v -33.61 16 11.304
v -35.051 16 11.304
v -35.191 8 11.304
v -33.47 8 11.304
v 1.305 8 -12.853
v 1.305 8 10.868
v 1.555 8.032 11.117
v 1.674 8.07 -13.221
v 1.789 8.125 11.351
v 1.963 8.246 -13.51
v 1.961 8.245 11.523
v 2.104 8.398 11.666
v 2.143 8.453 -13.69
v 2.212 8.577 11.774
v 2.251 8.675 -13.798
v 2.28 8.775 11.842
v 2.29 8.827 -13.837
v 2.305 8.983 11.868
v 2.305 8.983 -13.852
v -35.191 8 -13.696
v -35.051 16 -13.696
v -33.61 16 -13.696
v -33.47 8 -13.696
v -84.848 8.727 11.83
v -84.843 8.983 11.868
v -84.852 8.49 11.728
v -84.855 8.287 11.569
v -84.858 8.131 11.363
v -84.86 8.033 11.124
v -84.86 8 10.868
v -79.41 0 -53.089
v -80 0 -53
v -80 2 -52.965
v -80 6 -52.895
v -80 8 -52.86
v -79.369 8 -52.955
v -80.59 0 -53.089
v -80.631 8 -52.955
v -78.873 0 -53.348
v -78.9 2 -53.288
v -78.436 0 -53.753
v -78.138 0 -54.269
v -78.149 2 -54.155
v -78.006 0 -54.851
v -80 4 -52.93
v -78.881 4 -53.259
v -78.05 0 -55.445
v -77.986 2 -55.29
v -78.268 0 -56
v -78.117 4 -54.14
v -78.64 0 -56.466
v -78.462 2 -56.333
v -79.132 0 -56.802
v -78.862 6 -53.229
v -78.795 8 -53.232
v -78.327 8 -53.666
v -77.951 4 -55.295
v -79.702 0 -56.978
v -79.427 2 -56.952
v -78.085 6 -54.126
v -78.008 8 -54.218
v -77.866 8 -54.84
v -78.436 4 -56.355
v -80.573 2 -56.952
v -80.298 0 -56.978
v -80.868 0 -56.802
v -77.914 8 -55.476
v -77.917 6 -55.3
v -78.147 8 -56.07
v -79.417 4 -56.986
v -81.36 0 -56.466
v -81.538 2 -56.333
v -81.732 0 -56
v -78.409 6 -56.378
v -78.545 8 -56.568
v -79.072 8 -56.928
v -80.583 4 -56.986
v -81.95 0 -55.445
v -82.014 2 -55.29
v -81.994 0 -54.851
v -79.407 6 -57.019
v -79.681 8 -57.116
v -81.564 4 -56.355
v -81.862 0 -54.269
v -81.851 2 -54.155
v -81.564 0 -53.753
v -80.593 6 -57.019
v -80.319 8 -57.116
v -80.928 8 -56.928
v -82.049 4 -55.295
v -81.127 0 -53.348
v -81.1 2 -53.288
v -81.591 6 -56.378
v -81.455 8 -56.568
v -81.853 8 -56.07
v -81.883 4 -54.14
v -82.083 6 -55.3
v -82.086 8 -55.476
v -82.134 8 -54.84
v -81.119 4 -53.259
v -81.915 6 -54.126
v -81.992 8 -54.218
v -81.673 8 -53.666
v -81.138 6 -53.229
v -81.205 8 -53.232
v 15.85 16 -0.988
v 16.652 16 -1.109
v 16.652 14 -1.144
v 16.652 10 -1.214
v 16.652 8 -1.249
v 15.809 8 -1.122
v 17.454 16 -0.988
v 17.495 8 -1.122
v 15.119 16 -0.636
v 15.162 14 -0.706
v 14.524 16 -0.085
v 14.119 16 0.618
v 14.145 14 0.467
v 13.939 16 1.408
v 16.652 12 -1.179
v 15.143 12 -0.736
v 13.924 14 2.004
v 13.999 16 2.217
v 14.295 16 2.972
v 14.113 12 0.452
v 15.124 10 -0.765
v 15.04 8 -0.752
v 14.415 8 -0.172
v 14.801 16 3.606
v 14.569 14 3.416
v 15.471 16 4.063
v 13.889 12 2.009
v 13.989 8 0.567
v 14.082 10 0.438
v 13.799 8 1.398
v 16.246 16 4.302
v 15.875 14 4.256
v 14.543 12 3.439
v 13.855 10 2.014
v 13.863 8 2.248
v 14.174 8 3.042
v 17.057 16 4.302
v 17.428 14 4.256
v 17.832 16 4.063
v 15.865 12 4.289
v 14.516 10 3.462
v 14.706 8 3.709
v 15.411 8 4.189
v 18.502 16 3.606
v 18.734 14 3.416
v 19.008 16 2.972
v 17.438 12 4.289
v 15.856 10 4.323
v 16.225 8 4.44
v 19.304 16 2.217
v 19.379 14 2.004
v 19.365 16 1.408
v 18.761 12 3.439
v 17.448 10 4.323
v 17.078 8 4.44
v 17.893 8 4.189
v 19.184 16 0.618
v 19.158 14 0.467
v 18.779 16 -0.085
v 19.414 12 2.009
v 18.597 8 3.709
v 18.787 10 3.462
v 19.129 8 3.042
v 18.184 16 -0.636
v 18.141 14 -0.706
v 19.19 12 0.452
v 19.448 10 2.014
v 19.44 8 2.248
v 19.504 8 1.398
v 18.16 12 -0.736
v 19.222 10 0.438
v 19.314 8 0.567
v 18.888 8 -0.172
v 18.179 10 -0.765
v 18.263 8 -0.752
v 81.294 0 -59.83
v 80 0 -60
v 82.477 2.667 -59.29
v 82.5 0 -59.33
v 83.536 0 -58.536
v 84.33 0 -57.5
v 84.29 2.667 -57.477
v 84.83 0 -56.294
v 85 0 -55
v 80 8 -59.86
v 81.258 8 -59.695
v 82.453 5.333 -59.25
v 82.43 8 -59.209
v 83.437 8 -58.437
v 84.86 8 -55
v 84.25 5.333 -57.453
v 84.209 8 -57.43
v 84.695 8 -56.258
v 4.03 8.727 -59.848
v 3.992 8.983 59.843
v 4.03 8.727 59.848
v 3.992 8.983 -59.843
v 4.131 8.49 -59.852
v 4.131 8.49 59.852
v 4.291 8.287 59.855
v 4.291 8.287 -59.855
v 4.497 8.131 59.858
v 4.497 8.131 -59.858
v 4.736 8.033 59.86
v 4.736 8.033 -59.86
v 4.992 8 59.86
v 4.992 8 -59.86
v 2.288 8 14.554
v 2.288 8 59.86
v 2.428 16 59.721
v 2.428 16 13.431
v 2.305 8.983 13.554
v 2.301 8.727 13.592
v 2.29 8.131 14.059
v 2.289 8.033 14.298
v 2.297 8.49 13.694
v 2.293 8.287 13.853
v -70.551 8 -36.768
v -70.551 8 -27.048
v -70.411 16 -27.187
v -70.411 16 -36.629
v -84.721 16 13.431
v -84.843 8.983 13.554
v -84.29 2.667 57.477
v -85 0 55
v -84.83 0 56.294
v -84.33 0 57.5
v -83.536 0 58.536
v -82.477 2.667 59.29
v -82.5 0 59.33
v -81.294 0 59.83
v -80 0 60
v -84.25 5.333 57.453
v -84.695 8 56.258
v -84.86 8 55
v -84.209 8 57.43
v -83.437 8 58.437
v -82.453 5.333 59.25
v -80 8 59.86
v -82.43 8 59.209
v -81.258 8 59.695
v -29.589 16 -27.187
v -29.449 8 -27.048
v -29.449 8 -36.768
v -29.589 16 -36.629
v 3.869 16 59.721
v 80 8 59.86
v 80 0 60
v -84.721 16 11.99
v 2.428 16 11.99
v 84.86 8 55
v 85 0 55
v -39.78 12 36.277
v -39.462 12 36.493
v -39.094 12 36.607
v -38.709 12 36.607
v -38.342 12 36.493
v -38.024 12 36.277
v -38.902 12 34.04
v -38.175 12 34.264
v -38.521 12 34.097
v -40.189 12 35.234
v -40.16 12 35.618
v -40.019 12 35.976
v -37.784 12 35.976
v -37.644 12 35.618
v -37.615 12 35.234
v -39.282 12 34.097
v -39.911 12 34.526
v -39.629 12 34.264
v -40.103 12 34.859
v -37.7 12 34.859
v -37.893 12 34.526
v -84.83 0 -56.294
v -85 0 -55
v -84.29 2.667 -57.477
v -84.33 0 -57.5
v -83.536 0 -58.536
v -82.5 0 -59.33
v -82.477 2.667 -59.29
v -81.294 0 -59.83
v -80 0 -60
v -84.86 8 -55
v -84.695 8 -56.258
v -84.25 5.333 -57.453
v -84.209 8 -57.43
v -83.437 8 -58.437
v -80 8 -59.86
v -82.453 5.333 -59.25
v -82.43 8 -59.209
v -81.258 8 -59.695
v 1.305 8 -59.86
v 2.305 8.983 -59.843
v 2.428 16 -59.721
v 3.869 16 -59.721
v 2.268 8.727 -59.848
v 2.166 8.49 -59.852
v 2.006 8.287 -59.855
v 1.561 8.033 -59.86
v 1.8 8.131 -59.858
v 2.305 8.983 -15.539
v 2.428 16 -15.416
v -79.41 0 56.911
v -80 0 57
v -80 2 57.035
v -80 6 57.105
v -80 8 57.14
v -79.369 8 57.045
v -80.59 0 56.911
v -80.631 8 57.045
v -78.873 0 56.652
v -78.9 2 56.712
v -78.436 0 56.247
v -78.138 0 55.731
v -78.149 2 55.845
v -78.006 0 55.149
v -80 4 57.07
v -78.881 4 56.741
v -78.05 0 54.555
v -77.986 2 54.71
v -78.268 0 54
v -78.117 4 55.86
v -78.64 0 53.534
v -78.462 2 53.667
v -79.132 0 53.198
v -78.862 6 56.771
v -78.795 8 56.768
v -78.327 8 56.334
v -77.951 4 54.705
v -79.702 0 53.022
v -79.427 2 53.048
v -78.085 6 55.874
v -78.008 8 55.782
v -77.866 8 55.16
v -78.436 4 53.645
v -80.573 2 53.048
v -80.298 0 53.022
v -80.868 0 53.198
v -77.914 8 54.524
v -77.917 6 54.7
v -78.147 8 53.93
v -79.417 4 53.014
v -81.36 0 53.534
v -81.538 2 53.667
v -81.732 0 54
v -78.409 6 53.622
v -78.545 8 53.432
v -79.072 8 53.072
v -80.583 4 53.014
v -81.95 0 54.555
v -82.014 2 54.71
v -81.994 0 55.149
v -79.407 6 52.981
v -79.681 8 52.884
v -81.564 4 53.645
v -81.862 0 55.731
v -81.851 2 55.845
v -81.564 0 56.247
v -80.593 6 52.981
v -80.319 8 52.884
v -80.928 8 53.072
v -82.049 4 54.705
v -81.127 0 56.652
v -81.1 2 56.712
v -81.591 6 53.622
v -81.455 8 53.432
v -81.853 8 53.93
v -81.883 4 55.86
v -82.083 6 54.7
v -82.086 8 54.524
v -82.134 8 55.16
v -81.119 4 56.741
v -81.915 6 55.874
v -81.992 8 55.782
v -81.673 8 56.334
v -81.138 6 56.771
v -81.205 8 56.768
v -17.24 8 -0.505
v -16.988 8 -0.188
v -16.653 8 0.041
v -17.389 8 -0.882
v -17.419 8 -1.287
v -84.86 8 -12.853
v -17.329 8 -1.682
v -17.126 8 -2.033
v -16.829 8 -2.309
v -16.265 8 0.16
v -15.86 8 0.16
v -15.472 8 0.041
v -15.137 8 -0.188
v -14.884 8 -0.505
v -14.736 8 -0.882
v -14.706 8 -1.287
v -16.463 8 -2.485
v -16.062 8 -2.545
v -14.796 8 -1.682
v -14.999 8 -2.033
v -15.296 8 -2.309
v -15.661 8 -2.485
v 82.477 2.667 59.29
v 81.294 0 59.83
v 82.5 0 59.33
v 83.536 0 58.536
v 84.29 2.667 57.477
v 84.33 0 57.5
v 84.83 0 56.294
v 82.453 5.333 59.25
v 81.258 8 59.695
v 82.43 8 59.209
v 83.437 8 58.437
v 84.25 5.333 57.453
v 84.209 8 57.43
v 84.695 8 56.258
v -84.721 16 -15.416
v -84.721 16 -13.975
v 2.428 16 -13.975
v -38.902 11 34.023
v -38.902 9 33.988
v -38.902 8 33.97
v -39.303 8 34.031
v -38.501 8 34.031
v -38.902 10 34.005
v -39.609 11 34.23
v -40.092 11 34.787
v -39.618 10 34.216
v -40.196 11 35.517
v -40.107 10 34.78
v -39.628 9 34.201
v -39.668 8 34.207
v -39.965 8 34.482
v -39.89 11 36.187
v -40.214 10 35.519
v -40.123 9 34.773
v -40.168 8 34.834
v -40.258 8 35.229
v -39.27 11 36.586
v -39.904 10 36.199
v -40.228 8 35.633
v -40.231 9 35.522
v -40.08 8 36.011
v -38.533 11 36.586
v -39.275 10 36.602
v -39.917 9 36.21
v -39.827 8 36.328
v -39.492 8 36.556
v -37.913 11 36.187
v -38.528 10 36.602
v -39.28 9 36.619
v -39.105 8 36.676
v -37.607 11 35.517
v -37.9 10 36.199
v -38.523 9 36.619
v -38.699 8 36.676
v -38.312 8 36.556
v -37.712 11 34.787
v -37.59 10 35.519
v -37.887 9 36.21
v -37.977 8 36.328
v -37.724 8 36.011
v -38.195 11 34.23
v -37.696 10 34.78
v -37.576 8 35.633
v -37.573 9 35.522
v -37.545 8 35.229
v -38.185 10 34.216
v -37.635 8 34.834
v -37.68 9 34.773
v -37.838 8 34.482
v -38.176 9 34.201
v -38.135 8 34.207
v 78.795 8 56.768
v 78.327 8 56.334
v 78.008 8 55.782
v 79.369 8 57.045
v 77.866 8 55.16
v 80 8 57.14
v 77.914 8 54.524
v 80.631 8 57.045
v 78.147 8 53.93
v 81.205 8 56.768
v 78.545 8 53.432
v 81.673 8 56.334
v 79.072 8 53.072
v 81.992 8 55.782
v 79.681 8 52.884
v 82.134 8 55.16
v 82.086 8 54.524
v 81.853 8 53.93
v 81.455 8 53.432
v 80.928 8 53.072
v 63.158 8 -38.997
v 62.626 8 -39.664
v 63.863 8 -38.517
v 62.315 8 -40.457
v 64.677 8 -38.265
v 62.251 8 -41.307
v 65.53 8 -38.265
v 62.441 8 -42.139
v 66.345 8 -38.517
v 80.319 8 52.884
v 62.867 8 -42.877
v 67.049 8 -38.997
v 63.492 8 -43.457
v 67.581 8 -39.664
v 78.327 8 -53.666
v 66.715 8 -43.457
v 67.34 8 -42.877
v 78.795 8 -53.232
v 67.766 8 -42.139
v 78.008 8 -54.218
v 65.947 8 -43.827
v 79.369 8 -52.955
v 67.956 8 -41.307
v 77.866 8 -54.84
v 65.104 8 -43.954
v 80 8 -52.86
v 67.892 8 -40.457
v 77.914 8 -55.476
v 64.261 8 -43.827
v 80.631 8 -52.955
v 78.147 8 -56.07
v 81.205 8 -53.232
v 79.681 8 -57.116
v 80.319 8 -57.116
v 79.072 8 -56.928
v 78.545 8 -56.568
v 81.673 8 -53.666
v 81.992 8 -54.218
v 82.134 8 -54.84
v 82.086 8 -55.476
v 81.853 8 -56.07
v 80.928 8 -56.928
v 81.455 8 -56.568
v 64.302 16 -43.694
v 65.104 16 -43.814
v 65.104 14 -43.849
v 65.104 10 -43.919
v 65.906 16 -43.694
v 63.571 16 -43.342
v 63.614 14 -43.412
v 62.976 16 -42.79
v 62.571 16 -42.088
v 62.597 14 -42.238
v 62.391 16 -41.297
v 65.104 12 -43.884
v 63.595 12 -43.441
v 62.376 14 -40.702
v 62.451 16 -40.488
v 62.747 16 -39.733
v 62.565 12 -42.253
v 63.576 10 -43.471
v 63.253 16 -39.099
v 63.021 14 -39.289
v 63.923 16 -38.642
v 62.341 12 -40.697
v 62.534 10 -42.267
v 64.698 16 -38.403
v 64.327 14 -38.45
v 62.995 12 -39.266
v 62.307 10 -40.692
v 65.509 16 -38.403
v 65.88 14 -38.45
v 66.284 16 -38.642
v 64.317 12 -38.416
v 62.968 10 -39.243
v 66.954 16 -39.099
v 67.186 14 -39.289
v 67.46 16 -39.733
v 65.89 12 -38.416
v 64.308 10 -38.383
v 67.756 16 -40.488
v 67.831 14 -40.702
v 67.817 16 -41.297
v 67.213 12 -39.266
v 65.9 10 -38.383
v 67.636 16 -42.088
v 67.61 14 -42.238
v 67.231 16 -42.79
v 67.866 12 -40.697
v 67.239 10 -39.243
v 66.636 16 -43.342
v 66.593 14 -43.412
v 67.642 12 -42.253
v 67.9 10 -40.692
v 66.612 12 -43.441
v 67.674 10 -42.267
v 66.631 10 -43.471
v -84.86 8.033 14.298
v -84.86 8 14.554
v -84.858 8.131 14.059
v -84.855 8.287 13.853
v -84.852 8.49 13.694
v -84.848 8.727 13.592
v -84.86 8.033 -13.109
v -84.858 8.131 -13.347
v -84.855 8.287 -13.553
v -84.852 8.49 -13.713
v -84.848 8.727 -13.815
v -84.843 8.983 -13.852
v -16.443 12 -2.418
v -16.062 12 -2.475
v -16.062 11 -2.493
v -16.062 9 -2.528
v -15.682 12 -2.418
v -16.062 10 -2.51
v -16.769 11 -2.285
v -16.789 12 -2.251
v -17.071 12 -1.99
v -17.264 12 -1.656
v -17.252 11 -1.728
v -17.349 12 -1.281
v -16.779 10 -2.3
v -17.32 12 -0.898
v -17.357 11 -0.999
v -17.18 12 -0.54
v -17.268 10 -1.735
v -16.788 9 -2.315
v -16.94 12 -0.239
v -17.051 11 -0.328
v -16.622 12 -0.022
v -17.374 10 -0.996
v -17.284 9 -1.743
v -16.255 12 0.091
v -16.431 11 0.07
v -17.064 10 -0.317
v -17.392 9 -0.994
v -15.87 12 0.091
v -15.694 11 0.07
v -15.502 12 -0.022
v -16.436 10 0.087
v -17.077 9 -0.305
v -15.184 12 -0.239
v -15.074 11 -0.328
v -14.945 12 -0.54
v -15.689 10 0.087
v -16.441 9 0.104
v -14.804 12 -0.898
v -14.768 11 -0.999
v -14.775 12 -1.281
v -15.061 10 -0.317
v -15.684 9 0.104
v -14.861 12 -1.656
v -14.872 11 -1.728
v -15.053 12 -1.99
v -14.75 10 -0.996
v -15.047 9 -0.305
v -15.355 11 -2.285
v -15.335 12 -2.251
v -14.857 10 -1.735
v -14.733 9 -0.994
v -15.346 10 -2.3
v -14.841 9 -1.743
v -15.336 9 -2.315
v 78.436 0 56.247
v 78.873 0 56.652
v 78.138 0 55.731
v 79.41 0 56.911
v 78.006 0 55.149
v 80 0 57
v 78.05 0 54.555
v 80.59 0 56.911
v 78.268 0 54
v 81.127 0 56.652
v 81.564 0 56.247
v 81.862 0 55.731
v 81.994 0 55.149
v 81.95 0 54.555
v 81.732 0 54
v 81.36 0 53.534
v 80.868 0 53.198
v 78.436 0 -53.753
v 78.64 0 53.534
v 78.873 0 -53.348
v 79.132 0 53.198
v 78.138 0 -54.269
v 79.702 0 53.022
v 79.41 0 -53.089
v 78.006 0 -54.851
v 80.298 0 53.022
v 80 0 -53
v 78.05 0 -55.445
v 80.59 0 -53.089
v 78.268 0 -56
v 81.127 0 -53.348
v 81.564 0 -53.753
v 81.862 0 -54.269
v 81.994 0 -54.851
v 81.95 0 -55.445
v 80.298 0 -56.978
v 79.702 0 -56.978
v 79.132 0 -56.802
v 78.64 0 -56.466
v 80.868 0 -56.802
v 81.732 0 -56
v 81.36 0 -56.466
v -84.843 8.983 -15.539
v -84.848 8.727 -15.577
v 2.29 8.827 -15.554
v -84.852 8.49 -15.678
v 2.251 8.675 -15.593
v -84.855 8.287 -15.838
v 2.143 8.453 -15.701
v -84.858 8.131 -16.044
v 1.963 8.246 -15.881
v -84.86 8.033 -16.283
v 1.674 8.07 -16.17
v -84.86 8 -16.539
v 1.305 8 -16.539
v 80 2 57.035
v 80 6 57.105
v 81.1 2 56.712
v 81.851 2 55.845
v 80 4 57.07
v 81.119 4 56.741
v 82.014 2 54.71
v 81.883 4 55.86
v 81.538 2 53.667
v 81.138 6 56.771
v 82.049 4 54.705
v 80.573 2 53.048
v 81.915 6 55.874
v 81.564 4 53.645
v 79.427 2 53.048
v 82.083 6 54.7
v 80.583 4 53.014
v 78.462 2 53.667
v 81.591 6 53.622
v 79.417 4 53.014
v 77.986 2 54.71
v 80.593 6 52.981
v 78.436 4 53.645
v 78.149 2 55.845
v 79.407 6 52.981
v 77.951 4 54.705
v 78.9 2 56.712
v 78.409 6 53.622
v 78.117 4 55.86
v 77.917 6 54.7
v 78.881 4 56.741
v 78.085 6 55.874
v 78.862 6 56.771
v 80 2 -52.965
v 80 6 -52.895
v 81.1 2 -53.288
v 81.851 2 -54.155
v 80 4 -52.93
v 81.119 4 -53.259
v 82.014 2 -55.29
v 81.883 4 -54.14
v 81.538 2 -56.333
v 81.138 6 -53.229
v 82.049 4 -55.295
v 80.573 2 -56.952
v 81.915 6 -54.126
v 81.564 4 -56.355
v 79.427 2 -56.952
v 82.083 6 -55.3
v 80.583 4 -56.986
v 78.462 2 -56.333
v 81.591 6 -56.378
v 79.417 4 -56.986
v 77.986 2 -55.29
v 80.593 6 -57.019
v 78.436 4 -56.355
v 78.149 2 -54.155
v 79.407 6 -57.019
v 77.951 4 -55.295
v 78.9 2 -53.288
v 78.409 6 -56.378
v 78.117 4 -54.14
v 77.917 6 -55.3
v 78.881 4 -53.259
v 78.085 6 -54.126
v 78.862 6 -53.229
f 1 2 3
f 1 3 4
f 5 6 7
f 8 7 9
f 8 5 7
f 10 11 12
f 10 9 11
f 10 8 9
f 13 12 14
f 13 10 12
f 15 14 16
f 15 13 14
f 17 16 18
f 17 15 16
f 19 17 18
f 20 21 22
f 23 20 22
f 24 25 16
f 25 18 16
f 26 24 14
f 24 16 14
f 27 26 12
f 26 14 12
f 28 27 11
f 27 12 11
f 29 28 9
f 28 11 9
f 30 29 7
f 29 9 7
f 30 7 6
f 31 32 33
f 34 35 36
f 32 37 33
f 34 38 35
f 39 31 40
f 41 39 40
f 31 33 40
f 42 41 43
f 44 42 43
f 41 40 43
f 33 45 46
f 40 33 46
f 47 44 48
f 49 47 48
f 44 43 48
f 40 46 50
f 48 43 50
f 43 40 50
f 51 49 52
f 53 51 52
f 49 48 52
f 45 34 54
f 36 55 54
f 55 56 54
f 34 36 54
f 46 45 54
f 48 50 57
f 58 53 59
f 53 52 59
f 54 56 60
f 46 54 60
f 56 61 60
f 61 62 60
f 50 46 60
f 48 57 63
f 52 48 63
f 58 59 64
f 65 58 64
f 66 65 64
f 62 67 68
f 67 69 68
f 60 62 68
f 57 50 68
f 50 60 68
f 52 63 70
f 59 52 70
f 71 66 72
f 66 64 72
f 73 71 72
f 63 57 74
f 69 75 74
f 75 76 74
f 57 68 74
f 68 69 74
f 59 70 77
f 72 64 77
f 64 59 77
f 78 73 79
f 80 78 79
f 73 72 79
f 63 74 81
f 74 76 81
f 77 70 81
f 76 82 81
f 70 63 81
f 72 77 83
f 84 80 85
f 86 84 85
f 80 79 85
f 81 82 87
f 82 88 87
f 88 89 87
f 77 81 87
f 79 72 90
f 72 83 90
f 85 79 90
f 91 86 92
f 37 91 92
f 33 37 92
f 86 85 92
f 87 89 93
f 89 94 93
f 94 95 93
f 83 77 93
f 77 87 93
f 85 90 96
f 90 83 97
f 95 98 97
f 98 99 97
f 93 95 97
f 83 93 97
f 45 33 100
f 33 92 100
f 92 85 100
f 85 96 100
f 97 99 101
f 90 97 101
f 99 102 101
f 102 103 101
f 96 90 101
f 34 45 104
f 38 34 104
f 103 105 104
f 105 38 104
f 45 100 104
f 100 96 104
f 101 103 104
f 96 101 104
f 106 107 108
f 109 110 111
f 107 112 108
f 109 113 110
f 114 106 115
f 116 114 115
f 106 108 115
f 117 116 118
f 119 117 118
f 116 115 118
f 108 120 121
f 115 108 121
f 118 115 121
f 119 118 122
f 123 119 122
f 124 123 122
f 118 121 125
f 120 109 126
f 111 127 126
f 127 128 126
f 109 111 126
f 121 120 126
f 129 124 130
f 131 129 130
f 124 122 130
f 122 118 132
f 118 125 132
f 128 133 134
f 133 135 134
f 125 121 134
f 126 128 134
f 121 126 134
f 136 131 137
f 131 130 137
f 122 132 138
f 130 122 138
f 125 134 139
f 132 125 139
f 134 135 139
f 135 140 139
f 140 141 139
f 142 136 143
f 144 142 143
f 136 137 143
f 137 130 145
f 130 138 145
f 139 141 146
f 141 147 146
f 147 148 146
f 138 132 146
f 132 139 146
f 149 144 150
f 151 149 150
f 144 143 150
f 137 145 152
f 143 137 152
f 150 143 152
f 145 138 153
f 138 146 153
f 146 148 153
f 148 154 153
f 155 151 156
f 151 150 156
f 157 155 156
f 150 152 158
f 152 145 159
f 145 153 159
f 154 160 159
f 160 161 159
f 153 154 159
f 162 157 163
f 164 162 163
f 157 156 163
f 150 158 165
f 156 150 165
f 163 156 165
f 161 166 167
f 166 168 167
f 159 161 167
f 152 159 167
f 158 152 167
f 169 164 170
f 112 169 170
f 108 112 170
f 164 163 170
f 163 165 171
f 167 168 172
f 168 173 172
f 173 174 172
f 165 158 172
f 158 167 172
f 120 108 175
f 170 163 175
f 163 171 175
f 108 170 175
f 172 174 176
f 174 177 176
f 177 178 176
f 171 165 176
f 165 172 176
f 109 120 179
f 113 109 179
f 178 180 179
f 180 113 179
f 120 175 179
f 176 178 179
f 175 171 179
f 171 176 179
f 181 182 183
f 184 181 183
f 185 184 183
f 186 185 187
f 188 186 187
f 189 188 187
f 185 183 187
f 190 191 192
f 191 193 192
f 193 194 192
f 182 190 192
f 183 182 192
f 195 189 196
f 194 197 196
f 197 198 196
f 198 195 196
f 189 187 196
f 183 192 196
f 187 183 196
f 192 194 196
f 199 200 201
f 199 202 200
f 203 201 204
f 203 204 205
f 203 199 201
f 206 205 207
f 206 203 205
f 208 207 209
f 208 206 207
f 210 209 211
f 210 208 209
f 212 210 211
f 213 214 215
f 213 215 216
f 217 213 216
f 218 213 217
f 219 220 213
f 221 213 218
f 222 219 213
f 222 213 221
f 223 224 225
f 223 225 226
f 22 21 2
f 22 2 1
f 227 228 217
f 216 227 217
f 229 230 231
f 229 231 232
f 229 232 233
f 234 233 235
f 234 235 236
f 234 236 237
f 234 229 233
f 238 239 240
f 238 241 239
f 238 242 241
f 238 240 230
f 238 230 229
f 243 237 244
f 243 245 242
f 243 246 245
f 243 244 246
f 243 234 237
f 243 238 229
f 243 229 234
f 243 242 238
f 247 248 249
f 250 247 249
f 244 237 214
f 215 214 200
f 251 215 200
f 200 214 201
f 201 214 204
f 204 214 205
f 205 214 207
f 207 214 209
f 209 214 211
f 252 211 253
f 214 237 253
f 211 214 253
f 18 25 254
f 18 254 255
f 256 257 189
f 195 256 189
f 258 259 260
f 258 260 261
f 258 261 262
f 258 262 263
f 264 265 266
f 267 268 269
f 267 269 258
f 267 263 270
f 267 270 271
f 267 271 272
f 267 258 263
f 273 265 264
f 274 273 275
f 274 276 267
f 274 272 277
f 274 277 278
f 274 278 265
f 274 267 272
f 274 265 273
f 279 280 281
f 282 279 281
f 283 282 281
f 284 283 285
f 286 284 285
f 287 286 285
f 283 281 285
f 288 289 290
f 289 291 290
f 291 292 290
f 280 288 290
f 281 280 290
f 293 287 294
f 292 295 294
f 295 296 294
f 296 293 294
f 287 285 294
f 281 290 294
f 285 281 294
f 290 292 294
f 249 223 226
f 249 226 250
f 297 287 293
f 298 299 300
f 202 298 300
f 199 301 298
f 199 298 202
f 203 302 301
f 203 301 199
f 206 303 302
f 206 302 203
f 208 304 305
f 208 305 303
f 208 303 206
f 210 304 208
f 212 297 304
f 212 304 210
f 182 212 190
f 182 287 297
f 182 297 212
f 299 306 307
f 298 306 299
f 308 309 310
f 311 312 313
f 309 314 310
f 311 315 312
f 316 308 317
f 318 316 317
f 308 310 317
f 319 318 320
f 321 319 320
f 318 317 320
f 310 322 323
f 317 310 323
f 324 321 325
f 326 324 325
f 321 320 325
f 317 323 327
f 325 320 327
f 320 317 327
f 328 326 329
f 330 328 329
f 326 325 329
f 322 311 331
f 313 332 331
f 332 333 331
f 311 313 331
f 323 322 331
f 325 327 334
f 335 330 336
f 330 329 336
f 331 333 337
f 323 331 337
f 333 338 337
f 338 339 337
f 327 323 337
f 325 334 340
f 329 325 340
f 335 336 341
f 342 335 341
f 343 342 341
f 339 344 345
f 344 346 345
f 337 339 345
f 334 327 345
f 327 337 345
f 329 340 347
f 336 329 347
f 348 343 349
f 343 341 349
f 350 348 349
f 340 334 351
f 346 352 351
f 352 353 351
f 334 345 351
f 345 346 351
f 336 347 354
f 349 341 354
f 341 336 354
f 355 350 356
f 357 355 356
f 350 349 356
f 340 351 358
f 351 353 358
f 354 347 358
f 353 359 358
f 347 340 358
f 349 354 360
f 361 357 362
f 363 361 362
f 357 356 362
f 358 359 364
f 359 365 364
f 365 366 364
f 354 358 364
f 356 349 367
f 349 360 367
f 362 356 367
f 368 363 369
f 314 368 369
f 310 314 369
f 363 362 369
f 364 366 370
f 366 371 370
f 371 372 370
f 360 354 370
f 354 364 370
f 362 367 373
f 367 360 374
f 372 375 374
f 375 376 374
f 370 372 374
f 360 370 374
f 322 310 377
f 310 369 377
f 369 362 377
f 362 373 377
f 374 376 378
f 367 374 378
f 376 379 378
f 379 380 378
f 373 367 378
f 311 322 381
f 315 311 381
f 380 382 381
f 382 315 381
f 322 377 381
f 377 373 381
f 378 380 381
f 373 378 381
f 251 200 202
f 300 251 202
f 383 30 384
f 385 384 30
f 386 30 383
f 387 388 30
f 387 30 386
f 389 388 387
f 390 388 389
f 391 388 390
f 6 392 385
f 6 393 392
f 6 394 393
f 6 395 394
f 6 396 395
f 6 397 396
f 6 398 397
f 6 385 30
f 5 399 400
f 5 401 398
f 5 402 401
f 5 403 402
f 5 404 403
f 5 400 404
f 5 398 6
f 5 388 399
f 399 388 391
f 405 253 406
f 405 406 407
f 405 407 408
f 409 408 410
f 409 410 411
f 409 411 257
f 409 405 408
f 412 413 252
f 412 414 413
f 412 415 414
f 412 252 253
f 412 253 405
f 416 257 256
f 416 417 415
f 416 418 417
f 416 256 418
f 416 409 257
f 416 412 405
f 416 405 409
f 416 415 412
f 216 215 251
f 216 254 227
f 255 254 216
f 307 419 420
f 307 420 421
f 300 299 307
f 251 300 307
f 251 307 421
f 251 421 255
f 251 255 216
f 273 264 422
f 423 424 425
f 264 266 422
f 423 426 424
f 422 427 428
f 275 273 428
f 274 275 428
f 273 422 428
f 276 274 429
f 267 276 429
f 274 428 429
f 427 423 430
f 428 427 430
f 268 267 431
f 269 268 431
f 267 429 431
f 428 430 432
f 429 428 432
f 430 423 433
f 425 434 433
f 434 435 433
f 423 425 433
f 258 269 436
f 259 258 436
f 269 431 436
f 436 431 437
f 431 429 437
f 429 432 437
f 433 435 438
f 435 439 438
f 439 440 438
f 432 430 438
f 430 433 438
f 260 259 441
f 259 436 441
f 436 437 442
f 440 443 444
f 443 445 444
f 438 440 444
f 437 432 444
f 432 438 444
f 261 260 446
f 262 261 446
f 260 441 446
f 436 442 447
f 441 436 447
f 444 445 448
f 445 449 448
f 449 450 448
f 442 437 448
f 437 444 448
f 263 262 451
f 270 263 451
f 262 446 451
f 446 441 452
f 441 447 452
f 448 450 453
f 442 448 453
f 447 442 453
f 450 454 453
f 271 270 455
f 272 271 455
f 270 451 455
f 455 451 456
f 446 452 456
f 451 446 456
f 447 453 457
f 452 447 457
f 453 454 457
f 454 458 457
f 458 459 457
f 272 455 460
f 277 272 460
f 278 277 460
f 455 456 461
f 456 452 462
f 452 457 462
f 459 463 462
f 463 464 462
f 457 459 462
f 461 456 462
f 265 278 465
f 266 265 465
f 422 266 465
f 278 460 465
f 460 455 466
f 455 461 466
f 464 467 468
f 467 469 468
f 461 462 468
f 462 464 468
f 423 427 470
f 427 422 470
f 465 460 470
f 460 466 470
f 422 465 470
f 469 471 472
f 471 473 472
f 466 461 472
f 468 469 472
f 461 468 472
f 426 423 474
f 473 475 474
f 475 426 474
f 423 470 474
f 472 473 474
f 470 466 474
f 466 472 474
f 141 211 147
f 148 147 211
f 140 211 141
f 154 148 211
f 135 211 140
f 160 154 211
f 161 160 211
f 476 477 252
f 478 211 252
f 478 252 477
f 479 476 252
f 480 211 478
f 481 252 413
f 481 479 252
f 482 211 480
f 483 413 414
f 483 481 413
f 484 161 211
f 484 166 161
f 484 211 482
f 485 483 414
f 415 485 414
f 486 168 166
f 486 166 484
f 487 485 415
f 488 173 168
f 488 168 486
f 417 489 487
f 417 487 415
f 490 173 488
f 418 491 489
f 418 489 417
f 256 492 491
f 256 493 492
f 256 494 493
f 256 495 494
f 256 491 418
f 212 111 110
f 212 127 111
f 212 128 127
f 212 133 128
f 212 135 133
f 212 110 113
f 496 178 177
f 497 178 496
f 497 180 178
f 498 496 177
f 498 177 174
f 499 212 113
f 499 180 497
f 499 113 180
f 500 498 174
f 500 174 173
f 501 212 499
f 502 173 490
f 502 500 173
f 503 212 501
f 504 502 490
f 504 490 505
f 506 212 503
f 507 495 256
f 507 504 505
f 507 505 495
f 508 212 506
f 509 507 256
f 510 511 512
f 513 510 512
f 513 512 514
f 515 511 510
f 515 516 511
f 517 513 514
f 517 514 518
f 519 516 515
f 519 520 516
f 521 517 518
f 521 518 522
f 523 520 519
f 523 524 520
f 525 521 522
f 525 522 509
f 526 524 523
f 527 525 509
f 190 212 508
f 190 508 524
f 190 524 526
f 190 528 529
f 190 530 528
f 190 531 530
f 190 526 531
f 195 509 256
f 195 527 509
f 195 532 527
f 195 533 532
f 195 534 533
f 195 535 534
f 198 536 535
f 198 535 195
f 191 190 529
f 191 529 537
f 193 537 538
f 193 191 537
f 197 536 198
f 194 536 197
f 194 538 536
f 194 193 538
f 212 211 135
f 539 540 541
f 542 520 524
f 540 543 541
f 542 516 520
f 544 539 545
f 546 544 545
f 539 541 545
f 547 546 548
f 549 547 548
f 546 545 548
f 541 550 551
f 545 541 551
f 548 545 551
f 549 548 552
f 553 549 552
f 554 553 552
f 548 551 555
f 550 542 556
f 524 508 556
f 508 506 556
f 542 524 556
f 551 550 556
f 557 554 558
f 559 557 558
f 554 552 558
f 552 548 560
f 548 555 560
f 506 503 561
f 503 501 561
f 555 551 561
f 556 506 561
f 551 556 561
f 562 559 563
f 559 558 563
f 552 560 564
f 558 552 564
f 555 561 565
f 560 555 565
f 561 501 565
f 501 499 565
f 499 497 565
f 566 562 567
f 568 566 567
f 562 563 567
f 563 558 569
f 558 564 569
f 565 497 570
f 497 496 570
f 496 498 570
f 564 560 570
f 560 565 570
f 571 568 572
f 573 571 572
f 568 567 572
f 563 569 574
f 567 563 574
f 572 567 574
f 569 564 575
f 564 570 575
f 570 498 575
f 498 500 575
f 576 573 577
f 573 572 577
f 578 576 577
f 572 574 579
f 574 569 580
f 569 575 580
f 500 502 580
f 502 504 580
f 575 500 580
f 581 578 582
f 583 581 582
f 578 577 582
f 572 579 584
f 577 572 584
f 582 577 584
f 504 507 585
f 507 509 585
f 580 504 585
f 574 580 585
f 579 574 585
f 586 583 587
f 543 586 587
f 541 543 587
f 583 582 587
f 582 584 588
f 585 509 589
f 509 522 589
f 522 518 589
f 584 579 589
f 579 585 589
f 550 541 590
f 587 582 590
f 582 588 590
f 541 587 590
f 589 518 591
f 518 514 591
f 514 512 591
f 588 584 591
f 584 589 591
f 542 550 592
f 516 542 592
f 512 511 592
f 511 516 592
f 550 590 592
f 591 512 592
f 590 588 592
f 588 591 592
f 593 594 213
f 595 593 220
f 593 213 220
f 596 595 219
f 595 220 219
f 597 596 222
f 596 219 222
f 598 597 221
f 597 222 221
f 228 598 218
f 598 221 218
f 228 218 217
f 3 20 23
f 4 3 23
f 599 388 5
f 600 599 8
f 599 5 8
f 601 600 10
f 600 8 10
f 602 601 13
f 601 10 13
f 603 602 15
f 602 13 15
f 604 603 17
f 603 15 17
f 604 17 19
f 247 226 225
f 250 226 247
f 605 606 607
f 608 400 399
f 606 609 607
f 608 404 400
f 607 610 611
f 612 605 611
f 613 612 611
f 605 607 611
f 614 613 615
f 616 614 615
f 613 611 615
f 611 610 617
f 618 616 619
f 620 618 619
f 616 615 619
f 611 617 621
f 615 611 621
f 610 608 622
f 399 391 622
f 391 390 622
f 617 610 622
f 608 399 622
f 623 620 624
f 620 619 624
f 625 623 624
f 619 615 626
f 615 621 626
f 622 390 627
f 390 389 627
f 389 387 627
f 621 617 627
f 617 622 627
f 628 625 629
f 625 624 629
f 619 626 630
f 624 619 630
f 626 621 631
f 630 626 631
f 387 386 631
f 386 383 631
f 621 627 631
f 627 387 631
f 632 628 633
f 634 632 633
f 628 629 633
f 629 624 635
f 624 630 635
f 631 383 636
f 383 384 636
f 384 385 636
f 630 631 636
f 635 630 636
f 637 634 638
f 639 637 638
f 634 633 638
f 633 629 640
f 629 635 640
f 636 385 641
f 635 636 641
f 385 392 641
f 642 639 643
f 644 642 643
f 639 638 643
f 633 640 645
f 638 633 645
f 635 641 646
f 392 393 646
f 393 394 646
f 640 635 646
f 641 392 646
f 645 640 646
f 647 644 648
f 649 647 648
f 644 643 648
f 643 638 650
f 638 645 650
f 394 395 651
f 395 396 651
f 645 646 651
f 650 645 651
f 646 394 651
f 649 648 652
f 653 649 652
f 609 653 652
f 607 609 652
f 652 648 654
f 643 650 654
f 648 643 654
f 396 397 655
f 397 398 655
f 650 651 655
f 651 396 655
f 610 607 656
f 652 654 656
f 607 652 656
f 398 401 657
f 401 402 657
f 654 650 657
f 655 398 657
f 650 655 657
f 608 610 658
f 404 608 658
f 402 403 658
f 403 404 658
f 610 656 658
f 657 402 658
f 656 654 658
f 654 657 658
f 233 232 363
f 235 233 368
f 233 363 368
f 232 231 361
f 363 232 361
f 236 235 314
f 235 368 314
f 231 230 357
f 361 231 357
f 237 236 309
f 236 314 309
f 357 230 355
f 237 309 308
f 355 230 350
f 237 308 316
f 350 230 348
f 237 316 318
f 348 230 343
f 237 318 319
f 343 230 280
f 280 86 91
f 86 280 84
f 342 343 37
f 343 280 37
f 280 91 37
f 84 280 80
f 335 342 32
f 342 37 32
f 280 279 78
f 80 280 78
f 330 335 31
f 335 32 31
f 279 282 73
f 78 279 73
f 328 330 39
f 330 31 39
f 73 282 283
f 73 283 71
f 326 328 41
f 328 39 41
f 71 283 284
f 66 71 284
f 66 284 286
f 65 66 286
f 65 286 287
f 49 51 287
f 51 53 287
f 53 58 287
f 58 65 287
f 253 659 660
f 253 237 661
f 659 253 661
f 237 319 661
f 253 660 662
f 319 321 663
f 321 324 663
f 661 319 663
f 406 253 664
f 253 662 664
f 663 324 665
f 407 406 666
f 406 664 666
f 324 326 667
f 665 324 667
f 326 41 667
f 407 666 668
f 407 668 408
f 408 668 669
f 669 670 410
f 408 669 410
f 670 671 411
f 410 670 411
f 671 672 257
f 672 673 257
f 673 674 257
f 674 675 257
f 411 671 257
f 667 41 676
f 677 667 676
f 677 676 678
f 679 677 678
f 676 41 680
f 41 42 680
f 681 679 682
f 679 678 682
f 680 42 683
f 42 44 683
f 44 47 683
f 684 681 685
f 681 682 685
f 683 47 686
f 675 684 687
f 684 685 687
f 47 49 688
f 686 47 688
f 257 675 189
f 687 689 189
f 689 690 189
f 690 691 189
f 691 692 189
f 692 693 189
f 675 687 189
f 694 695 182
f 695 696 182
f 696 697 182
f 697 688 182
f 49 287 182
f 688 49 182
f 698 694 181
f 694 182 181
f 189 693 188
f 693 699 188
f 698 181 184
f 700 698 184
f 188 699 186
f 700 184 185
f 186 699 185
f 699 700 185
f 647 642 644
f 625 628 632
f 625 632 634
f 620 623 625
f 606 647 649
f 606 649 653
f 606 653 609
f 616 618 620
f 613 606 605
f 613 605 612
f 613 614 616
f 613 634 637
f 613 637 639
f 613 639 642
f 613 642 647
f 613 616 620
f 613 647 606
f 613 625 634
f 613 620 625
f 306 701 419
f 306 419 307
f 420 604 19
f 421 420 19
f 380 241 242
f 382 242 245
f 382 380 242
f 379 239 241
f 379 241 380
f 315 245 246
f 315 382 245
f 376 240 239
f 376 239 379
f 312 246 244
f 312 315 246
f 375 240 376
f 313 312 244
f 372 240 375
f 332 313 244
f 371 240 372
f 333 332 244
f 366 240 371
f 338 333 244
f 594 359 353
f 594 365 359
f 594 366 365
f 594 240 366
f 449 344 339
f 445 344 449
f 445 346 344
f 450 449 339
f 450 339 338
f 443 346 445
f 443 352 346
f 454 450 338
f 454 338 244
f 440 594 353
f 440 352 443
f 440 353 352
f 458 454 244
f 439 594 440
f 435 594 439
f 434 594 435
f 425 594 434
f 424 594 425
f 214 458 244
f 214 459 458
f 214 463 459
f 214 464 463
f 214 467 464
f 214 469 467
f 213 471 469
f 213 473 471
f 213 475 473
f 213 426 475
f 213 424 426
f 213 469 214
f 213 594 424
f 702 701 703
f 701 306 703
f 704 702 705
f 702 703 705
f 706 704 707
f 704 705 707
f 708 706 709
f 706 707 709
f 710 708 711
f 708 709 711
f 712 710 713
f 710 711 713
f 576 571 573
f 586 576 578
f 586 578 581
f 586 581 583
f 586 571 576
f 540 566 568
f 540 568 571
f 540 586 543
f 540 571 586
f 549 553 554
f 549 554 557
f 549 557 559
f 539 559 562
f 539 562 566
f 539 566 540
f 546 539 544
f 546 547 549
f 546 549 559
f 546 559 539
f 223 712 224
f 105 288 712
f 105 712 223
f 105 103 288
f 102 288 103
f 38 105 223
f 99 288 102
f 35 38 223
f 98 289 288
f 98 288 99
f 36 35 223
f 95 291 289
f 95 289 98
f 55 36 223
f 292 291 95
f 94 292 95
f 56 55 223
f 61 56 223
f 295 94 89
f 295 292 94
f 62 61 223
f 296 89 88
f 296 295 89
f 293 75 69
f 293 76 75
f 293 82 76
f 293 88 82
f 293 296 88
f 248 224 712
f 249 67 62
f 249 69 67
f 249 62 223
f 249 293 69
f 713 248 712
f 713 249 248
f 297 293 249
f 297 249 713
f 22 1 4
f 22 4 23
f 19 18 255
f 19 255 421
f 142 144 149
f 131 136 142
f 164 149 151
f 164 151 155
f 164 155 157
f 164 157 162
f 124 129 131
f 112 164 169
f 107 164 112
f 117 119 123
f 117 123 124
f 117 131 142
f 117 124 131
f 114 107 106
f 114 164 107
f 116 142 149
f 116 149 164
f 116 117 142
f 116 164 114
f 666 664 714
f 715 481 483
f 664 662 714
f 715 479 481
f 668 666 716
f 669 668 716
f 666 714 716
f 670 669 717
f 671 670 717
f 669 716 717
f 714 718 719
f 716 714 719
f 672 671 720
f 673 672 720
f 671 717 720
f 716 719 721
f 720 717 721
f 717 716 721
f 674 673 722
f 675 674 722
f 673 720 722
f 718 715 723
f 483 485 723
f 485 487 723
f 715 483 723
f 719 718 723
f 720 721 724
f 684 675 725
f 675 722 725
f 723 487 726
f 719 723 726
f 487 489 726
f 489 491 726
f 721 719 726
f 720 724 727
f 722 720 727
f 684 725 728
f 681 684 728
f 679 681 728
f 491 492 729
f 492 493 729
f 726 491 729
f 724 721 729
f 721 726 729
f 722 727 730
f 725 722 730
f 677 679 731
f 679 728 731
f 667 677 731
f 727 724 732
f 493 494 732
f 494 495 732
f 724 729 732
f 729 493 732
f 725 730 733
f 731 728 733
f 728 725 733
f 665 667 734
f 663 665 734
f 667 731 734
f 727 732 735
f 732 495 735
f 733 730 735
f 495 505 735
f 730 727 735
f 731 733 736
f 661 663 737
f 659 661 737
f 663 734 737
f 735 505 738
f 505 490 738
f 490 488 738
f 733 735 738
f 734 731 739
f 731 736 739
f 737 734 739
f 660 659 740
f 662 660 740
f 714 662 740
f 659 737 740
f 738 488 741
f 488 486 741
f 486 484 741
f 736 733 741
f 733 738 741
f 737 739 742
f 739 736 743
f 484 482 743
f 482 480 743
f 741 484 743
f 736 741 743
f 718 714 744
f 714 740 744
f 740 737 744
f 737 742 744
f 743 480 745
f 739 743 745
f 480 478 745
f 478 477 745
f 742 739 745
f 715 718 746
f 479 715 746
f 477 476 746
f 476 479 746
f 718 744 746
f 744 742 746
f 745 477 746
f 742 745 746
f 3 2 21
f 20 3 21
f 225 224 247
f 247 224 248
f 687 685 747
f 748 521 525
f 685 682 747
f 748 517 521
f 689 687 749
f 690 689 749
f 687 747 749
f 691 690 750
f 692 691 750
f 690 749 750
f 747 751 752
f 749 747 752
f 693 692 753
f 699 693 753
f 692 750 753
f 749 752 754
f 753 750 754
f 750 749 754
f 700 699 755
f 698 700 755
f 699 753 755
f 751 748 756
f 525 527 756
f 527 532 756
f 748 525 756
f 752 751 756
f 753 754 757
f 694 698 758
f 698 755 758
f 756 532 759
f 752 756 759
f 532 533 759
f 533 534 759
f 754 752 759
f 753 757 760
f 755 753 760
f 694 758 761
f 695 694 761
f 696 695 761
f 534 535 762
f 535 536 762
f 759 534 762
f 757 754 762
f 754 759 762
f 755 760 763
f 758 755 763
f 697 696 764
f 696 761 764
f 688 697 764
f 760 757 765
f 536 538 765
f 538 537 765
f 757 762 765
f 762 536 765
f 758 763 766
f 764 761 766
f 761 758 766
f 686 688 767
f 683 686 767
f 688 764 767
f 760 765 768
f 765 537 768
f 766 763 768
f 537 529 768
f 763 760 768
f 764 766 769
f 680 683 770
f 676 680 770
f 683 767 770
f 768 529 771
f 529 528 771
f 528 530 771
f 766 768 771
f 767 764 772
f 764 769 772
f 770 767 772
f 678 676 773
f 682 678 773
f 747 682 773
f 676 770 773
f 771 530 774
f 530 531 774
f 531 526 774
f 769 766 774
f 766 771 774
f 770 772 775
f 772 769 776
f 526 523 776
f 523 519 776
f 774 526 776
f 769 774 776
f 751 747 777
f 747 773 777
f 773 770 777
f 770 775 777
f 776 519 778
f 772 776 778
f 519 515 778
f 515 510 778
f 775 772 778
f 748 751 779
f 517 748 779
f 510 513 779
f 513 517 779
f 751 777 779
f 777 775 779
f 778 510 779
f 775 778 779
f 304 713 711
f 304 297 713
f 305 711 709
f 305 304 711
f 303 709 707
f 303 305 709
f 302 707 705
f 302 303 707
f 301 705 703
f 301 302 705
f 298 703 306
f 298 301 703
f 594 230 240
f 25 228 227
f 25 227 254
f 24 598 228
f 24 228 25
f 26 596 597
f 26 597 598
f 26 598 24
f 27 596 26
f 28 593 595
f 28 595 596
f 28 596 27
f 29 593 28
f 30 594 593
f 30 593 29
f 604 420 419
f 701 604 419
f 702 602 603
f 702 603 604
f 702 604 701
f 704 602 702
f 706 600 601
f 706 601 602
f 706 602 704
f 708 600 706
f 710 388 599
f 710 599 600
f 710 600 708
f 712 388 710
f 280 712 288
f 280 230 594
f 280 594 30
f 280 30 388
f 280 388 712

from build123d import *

# Parameters (mm, degrees)
SKETCH1_W            = 170
SKETCH1_H            = 120
BOSS_EXTRUDE1_DEPTH  = 8
SKETCH2_W            = 41.380626675
SKETCH2_H            = 10
BOSS_EXTRUDE2_DEPTH  = 8
SKETCH3_R            = 2
CUT_EXTRUDE1_DEPTH   = 8
SKETCH7_R            = 3
BOSS_EXTRUDE3_DEPTH  = 8
SKETCH8_R            = 1.5
BOSS_EXTRUDE6_DEPTH  = 4
SKETCH9_R            = 1.5
BOSS_EXTRUDE7_DEPTH  = 4
SKETCH10_R           = 3
BOSS_EXTRUDE8_DEPTH  = 8
SKETCH11_W           = 2
SKETCH11_H           = 120
BOSS_EXTRUDE9_DEPTH  = 8
SKETCH13_W           = 87.148503305
SKETCH13_H           = 2
BOSS_EXTRUDE10_DEPTH = 8
BOSS_EXTRUDE11_START = -1.289738394
SKETCH7_3_R          = 3
BOSS_EXTRUDE11_DEPTH = 1.289738394
SKETCH14_W           = 2
SKETCH14_H           = 25
BOSS_EXTRUDE13_DEPTH = 8
SKETCH18_W           = 87.148503305
SKETCH18_H           = 2
BOSS_EXTRUDE16_DEPTH = 8
SKETCH19_R           = 1.5
BOSS_EXTRUDE17_DEPTH = 4
DRAFT3_ANGLE         = 1
FILLET1_R            = 1
FILLET6_R            = 5
DRAFT1_ANGLE         = -1
DRAFT2_ANGLE         = 1
DRAFT4_ANGLE         = 1


with BuildPart() as part:
    # Sketch1 → Boss-Extrude1 (new body)
    with BuildSketch(Plane(origin=(0, 0, 0), x_dir=(1, 0, 0), z_dir=(0, 1, 0))):
        Rectangle(SKETCH1_W, SKETCH1_H)
    extrude(amount=BOSS_EXTRUDE1_DEPTH)

    # Sketch2 → Boss-Extrude2 (add)
    with BuildSketch(Plane(origin=(-17.791513114, 8, -3.068036611), x_dir=(1, 0, 0), z_dir=(0, 1, 0))):
        with Locations((-32.208486886, 28.840032215)):
            Rectangle(SKETCH2_W, SKETCH2_H)
    extrude(amount=BOSS_EXTRUDE2_DEPTH)

    # Sketch3 → Cut-Extrude1 (cut)
    with BuildSketch(Plane(origin=(0, 8, 0), x_dir=(1, 0, 0), z_dir=(0, 1, 0))):
        with Locations((-80, 55)):
            Circle(SKETCH3_R)
        with Locations((-80, -55)):
            Circle(SKETCH3_R)
        with Locations((80, 55)):
            Circle(SKETCH3_R)
        with Locations((80, -55)):
            Circle(SKETCH3_R)
    extrude(amount=-CUT_EXTRUDE1_DEPTH, mode=Mode.SUBTRACT)

    # Sketch7 → Boss-Extrude3 (add)
    with BuildSketch(Plane(origin=(12.703147983, 8, 3.565766466), x_dir=(1, 0, 0), z_dir=(0, 1, 0))):
        with Locations((52.400485428, 44.659504627)):
            Circle(SKETCH7_R)
    extrude(amount=BOSS_EXTRUDE3_DEPTH)

    # Sketch8 → Boss-Extrude6 (add)
    with BuildSketch(Plane(origin=(0, 16, 3.565766466), x_dir=(1, 0, 0), z_dir=(0, 1, 0))):
        with Locations((65.103633411, 44.659504627)):
            Circle(SKETCH8_R)
    extrude(amount=-BOSS_EXTRUDE6_DEPTH)

    # Sketch9 → Boss-Extrude7 (add)
    with BuildSketch(Plane(origin=(0, 16, 3.565766466), x_dir=(1, 0, 0), z_dir=(0, 1, 0))):
        with Locations((64.905146724, 44.273718651)):
            Circle(SKETCH9_R)
    extrude(amount=-BOSS_EXTRUDE7_DEPTH)

    # Sketch10 → Boss-Extrude8 (add)
    with BuildSketch(Plane(origin=(-8.754663217, 8, 20.46794397), x_dir=(1, 0, 0), z_dir=(0, 1, 0))):
        with Locations((25.406295965, 18.856235287)):
            Circle(SKETCH10_R)
    extrude(amount=BOSS_EXTRUDE8_DEPTH)

    # Sketch11 → Boss-Extrude9 (add)
    with BuildSketch(Plane(origin=(4.148503305, 8, 0), x_dir=(1, 0, 0), z_dir=(0, 1, 0))):
        with Locations((-1, 0)):
            Rectangle(SKETCH11_W, SKETCH11_H)
    extrude(amount=BOSS_EXTRUDE9_DEPTH)

    # Sketch13 → Boss-Extrude10 (add)
    with BuildSketch(Plane(origin=(0, 8, 0), x_dir=(1, 0, 0), z_dir=(0, 1, 0))):
        with Locations((-41.425748347, 14.695581419)):
            Rectangle(SKETCH13_W, SKETCH13_H)
    extrude(amount=BOSS_EXTRUDE10_DEPTH)

    # Sketch7<3> → Boss-Extrude11 (add)
    with BuildSketch(Plane(origin=(12.703147983, 8, 3.565766466), x_dir=(1, 0, 0), z_dir=(0, 1, 0)).offset(BOSS_EXTRUDE11_START)):
        with Locations((52.400485428, 44.659504627)):
            Circle(SKETCH7_3_R)
    extrude(amount=BOSS_EXTRUDE11_DEPTH)

    # Sketch18 → Boss-Extrude16 (add)
    with BuildSketch(Plane(origin=(0, 8, 0), x_dir=(1, 0, 0), z_dir=(0, 1, 0))):
        with Locations((-41.425748347, -12.710714547)):
            Rectangle(SKETCH18_W, SKETCH18_H)
    extrude(amount=BOSS_EXTRUDE16_DEPTH)

    # Sketch19 → Boss-Extrude17 (add)
    with BuildSketch(Plane(origin=(0, 8, 0), x_dir=(1, 0, 0), z_dir=(0, 1, 0))):
        with Locations((-16.06228854, 1.18486687)):
            Circle(SKETCH19_R)
        with Locations((-38.901806458, -35.330630327)):
            Circle(SKETCH19_R)
    extrude(amount=BOSS_EXTRUDE17_DEPTH)

    # Draft3
    draft3_faces = [part.faces().sort_by_distance(p)[0] for p in [
        (-17.56228854, 10, -1.18486687),
        (78, 4, -55),
        (-82, 4, -55),
        (78, 4, 55),
        (-82, 4, 55),
        (4.148503305, 12, 0),
        (-29.309686662, 12, -31.908068826),
        (-50, 12, -26.908068826),
        (-70.690313338, 12, -31.908068826),
        (-50, 12, -36.908068826),
        (-40.401806458, 10, 35.330630327),
        (13.651632748, 12, 1.611708683),
        (62.103633411, 12, -41.093738161),
        (-41.425748348, 12, -13.695581419),
        (-41.425748348, 12, -15.695581419),
        (-41.425748348, 12, 11.710714547),
        (-41.425748348, 12, 13.710714547),
        (2.148503305, 12, 36.855357273),
        (2.148503305, 12, -0.992433436),
        (2.148503305, 12, -37.847790709),
    ]]
    draft(draft3_faces, Plane.ZX, DRAFT3_ANGLE)

    # Fillet1
    fillet1_edges = [part.edges().sort_by_distance(p)[0] for p in [
        (-41.355928088, 8, 13.571074027),
        (-41.355928088, 8, 11.850355066),
        (-41.355928088, 8, -13.835221938),
        (2.288143824, 8, -0.992433436),
        (4.008862785, 8, 0),
        (2.288143824, 8, -37.77797045),
        (-41.355928088, 8, -15.555940899),
    ]]
    fillet(fillet1_edges, radius=FILLET1_R)

    # Fillet6
    fillet6_edges = [part.edges().sort_by_distance(p)[0] for p in [
        (85, 4, -60),
        (85, 4, 60),
        (-85, 4, 60),
        (-85, 4, -60),
    ]]
    fillet(fillet6_edges, radius=FILLET6_R)

    # Draft1
    draft1_faces = [part.faces().sort_by_distance(p)[0] for p in [
        (83.535533906, 4, 58.535533906),
        (85, 4, 0),
        (83.535533906, 4, -58.535533906),
        (0.031801749, 4.078447927, -60),
        (-83.535533906, 4, -58.535533906),
        (-83.535533906, 4, 58.535533906),
        (-85, 4.2238948, -0.028609533),
        (0.031476466, 4.077788114, 60),
    ]]
    draft(draft1_faces, Plane.ZX, DRAFT1_ANGLE)

    # Draft2
    draft2_faces = [part.faces().sort_by_distance(p)[0] for p in [
        (83.584904285, 4, -58.584904285),
        (85.06982026, 4, 0),
        (83.584904285, 4, 58.584904285),
        (0.031476466, 4.077788114, 60.071178056),
        (-83.584904285, 4, 58.584904285),
        (-85.073728358, 4.2238948, -0.028609533),
        (-83.584904285, 4, -58.584904285),
        (0.031801749, 4.078447927, -60.071189573),
    ]]
    draft(draft2_faces, Plane.ZX, DRAFT2_ANGLE)


with BuildPart() as body_2:
    # Sketch14 → Boss-Extrude13 (new body)
    with BuildSketch(Plane(origin=(0, 16, 0), x_dir=(1, 0, 0), z_dir=(0, 1, 0))):
        with Locations((-34.330630327, 1.195581419)):
            Rectangle(SKETCH14_W, SKETCH14_H)
    extrude(amount=-BOSS_EXTRUDE13_DEPTH)

    # Draft4
    draft4_faces = [body_2.faces().sort_by_distance(p)[0] for p in [
        (-35.330630327, 12, -1.195581419),
        (-33.330630327, 12, -1.195581419),
    ]]
    draft(draft4_faces, Plane.ZX, DRAFT4_ANGLE)


solid = Compound([part.part, body_2.part])
